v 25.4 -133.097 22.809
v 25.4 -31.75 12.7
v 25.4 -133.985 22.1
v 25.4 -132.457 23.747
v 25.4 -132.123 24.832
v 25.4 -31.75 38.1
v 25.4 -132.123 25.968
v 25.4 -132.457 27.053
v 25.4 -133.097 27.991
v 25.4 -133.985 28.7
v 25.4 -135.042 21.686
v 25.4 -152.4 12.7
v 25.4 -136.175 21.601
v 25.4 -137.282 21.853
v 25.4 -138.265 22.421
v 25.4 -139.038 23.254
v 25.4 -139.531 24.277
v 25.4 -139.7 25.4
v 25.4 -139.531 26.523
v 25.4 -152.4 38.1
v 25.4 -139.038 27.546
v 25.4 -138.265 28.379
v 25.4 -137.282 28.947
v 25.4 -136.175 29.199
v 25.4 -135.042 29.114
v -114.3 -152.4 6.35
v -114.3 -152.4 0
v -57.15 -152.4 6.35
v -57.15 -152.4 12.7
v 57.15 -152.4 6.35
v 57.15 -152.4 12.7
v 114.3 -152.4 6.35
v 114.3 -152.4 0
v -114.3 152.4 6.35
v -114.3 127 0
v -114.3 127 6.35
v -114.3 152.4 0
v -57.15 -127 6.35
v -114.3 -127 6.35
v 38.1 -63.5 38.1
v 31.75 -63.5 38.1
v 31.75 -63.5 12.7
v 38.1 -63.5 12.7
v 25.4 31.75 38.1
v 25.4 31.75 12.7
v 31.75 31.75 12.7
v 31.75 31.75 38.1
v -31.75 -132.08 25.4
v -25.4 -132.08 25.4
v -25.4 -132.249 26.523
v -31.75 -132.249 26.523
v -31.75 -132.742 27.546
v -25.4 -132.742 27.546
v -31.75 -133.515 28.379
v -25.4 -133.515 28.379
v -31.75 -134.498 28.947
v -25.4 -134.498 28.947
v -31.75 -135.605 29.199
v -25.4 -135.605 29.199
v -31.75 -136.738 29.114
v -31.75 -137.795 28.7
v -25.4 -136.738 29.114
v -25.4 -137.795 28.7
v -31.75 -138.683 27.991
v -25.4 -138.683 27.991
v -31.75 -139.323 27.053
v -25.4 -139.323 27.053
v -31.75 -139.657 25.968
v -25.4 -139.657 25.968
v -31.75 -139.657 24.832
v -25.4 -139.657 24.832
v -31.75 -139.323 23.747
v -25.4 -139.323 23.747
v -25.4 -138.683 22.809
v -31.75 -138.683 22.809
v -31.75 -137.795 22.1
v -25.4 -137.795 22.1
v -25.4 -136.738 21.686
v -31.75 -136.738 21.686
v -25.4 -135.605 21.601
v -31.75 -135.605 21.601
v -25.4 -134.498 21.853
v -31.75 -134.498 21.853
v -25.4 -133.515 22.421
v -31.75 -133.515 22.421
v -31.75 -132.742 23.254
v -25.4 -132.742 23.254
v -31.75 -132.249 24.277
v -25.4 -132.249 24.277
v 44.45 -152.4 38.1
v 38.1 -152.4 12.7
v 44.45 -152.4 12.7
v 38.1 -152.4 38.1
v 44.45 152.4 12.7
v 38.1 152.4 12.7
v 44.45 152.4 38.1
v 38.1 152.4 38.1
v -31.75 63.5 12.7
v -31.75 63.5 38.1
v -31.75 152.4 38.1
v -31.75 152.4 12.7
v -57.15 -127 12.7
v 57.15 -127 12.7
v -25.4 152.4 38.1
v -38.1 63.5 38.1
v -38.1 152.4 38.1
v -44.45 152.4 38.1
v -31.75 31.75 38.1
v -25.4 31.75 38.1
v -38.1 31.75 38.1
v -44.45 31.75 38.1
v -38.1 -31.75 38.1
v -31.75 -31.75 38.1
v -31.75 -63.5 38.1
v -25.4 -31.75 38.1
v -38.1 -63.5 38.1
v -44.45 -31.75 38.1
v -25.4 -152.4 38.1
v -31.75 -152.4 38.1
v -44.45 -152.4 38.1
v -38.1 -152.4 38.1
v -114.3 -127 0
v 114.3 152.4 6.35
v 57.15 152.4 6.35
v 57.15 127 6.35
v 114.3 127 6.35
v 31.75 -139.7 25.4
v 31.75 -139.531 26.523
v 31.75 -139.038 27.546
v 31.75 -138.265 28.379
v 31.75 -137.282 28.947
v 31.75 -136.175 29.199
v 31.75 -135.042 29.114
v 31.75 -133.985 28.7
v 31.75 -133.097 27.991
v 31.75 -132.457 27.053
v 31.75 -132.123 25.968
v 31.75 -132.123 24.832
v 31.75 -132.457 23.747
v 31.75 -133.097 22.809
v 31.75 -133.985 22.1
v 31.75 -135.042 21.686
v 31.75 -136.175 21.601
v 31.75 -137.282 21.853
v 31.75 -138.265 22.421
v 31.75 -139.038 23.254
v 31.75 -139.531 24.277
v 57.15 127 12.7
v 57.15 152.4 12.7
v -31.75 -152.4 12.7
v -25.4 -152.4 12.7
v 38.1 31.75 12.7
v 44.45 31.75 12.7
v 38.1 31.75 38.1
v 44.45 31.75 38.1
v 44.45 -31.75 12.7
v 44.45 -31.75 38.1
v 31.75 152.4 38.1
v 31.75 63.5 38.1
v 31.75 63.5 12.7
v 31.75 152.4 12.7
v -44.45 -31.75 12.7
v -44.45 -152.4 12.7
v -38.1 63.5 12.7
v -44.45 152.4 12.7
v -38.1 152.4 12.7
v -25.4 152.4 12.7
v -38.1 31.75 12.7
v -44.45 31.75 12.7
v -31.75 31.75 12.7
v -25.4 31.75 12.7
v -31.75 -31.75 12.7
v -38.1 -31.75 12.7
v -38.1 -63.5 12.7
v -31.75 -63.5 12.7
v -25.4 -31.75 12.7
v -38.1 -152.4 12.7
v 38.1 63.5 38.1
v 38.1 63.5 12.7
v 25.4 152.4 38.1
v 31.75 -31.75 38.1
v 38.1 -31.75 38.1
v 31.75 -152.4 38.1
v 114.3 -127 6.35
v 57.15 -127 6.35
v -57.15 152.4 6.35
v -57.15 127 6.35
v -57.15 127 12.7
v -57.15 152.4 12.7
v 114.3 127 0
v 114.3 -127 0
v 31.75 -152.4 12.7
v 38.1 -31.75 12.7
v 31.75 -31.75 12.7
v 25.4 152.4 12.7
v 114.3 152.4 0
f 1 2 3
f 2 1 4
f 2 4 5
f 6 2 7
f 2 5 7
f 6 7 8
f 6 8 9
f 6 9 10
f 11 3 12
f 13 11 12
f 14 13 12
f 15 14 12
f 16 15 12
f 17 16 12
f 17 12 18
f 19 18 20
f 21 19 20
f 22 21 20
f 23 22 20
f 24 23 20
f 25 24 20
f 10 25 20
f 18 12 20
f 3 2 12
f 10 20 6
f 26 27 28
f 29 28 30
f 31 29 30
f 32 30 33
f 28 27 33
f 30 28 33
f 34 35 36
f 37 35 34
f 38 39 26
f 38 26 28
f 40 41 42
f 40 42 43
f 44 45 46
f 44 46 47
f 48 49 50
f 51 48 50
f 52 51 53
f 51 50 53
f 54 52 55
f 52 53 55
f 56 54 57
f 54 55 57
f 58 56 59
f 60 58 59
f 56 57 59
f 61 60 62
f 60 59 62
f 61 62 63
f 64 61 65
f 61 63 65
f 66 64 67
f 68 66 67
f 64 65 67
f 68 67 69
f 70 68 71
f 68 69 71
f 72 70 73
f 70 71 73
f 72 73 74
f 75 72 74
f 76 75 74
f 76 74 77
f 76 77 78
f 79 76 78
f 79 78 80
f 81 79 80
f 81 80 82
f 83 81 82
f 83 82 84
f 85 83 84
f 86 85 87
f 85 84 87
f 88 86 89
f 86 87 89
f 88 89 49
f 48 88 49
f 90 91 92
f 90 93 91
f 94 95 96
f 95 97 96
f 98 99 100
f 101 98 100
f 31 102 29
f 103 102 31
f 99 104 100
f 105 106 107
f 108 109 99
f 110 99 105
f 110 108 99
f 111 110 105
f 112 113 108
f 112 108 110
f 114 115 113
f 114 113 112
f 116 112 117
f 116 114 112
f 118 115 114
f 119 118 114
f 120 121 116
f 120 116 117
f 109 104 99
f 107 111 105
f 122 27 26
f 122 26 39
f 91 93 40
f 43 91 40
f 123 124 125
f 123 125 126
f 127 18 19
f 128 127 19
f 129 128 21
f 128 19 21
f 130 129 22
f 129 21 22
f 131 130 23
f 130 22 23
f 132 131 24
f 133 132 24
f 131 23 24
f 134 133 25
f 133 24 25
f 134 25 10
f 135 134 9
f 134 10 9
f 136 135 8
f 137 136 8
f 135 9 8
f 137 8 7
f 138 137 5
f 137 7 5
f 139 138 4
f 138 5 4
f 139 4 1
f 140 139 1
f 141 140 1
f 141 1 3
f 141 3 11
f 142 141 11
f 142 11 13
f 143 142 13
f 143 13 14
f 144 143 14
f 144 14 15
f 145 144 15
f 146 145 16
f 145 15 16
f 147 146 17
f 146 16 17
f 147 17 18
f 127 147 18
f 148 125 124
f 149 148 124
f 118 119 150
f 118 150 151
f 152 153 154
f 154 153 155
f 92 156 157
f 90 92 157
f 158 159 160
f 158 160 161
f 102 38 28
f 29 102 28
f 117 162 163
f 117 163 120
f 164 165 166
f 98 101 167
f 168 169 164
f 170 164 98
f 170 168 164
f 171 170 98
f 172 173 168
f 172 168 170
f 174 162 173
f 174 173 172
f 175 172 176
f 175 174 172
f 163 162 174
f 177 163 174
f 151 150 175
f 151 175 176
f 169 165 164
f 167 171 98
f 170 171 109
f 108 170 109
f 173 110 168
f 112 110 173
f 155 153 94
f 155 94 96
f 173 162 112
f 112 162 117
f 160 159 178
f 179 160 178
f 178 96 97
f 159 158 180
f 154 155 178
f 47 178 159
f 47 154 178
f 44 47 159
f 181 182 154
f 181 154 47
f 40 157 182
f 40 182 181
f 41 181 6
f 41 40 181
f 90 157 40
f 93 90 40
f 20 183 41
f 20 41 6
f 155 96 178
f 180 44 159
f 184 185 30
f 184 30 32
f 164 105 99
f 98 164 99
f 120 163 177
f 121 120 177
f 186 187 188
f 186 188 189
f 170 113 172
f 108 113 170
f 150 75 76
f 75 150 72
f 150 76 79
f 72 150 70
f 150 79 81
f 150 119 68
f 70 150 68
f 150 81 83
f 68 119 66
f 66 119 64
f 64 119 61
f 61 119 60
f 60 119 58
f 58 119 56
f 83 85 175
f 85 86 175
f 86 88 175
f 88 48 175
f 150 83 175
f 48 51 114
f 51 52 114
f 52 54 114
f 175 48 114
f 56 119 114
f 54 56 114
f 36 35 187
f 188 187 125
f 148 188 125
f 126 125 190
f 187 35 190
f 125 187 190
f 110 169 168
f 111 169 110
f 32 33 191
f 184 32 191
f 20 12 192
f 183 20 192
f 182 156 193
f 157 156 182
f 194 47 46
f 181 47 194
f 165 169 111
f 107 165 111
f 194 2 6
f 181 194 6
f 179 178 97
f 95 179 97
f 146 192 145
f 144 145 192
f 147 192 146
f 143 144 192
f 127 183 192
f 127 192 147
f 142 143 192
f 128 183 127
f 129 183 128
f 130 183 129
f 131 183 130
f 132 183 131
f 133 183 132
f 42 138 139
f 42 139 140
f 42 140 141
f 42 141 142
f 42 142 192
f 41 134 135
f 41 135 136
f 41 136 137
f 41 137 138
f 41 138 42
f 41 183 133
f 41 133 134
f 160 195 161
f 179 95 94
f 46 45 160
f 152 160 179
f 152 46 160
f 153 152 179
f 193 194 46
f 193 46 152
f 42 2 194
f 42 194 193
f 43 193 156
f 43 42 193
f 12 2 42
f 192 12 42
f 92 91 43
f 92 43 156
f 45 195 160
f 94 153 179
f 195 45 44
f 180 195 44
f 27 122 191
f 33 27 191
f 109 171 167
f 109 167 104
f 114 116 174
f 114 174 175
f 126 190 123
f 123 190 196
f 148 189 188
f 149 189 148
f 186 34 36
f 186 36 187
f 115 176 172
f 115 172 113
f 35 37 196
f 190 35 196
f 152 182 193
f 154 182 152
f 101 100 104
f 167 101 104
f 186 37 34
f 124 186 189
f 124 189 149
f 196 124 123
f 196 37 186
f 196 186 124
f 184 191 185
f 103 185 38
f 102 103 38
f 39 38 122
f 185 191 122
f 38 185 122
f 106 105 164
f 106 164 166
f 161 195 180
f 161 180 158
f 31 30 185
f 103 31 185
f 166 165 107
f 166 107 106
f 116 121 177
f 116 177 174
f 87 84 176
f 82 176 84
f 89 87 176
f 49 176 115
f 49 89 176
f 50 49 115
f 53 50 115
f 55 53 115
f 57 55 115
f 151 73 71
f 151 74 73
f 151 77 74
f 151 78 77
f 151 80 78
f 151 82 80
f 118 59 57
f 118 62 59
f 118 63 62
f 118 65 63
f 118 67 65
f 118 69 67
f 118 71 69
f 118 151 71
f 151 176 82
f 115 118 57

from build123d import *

# Parameters (mm, degrees)
F0_W      = 57.15
F0_H      = 25.4
F1_DEPTH  = 6.35
F0_W_2    = 114.3
F2_DEPTH  = 12.7
F4_W      = 6.35
F4_H      = 25.4
F5_DEPTH  = 304.8
F6_W      = 63.5
F6_H      = 25.4
F7_DEPTH  = 6.35
F8_W      = 63.5
F8_H      = 25.4
F9_DEPTH  = 6.35
F10_W     = 63.5
F10_H     = 25.4
F11_DEPTH = 6.35
F12_W     = 63.5
F12_H     = 25.4
F13_DEPTH = 6.35
F14_W     = 6.35
F14_H     = 88.9
F15_DEPTH = 25.4
F16_R     = 3.81
F17_DEPTH = 6.35
F18_R     = 3.81
F19_DEPTH = 6.35


with BuildPart() as f1:
    # F0 (on Top) → F1 (new body)
    with BuildSketch(Plane.XY):
        with Locations((85.725, -139.7)):
            Rectangle(F0_W, F0_H)
        with Locations((-85.725, -139.7)):
            Rectangle(F0_W, F0_H)
        with Locations((-85.725, 139.7)):
            Rectangle(F0_W, F0_H)
        with Locations((85.725, 139.7)):
            Rectangle(F0_W, F0_H)
    extrude(amount=F1_DEPTH)


with BuildPart() as f2:
    # F0 (on Top) → F2 (new body)
    with BuildSketch(Plane.XY):
        Polygon((-57.15, -127), (-57.15, -152.4), (57.15, -152.4), (57.15, -127), (0, -127), align=None)
        with Locations((0, 139.7)):
            Rectangle(F0_W_2, F0_H)
    extrude(amount=F2_DEPTH)


with BuildPart() as f1_1:
    add(f1.part)

    # F3: union F2
    add(f2.part)


with BuildPart() as f5:
    # F4 (on face) → F5 (new body)
    with BuildSketch(Plane.XZ.offset(152.4)):
        with Locations((-41.275, 25.4)):
            Rectangle(F4_W, F4_H)
        with Locations((-28.575, 25.4)):
            Rectangle(F4_W, F4_H)
        with Locations((41.275, 25.4)):
            Rectangle(F4_W, F4_H)
        with Locations((-34.925, 25.4)):
            Rectangle(F4_W, F4_H)
        with Locations((28.575, 25.4)):
            Rectangle(F4_W, F4_H)
        with Locations((34.925, 25.4)):
            Rectangle(F4_W, F4_H)
    extrude(amount=-F5_DEPTH)

    # F6 (on face) → F7 (cut)
    with BuildSketch(Plane.YZ.offset(44.45)):
        with Locations((0, 25.4)):
            Rectangle(F6_W, F6_H)
    extrude(amount=-F7_DEPTH, mode=Mode.SUBTRACT)

    # F8 (on face) → F9 (cut)
    with BuildSketch(Plane(origin=(25.4, 0, 0), x_dir=(0, -1, 0), z_dir=(-1, 0, 0))):
        with Locations((0, 25.4)):
            Rectangle(F8_W, F8_H)
    extrude(amount=-F9_DEPTH, mode=Mode.SUBTRACT)

    # F10 (on face) → F11 (cut)
    with BuildSketch(Plane(origin=(-44.45, 0, 0), x_dir=(0, -1, 0), z_dir=(-1, 0, 0))):
        with Locations((0, 25.4)):
            Rectangle(F10_W, F10_H)
    extrude(amount=-F11_DEPTH, mode=Mode.SUBTRACT)

    # F12 (on face) → F13 (cut)
    with BuildSketch(Plane.YZ.offset(-25.4)):
        with Locations((0, 25.4)):
            Rectangle(F12_W, F12_H)
    extrude(amount=-F13_DEPTH, mode=Mode.SUBTRACT)

    # F14 (on face) → F15 (cut)
    with BuildSketch(Plane.XY.offset(38.1)):
        with Locations((-34.925, 107.95)):
            Rectangle(F14_W, F14_H)
        with Locations((-34.925, -107.95)):
            Rectangle(F14_W, F14_H)
        with Locations((34.925, 107.95)):
            Rectangle(F14_W, F14_H)
        with Locations((34.925, -107.95)):
            Rectangle(F14_W, F14_H)
    extrude(amount=-F15_DEPTH, mode=Mode.SUBTRACT)

    # F16 (on face) → F17 (cut)
    with BuildSketch(Plane.YZ.offset(-25.4)):
        with Locations((-135.89, 25.4)):
            Circle(F16_R)
    extrude(amount=-F17_DEPTH, mode=Mode.SUBTRACT)

    # F18 (on face) → F19 (cut)
    with BuildSketch(Plane(origin=(25.4, 0, 0), x_dir=(0, -1, 0), z_dir=(-1, 0, 0))):
        with Locations((135.89, 25.4)):
            Circle(F18_R)
    extrude(amount=-F19_DEPTH, mode=Mode.SUBTRACT)


solid = Compound([f1_1.part, f5.part])
